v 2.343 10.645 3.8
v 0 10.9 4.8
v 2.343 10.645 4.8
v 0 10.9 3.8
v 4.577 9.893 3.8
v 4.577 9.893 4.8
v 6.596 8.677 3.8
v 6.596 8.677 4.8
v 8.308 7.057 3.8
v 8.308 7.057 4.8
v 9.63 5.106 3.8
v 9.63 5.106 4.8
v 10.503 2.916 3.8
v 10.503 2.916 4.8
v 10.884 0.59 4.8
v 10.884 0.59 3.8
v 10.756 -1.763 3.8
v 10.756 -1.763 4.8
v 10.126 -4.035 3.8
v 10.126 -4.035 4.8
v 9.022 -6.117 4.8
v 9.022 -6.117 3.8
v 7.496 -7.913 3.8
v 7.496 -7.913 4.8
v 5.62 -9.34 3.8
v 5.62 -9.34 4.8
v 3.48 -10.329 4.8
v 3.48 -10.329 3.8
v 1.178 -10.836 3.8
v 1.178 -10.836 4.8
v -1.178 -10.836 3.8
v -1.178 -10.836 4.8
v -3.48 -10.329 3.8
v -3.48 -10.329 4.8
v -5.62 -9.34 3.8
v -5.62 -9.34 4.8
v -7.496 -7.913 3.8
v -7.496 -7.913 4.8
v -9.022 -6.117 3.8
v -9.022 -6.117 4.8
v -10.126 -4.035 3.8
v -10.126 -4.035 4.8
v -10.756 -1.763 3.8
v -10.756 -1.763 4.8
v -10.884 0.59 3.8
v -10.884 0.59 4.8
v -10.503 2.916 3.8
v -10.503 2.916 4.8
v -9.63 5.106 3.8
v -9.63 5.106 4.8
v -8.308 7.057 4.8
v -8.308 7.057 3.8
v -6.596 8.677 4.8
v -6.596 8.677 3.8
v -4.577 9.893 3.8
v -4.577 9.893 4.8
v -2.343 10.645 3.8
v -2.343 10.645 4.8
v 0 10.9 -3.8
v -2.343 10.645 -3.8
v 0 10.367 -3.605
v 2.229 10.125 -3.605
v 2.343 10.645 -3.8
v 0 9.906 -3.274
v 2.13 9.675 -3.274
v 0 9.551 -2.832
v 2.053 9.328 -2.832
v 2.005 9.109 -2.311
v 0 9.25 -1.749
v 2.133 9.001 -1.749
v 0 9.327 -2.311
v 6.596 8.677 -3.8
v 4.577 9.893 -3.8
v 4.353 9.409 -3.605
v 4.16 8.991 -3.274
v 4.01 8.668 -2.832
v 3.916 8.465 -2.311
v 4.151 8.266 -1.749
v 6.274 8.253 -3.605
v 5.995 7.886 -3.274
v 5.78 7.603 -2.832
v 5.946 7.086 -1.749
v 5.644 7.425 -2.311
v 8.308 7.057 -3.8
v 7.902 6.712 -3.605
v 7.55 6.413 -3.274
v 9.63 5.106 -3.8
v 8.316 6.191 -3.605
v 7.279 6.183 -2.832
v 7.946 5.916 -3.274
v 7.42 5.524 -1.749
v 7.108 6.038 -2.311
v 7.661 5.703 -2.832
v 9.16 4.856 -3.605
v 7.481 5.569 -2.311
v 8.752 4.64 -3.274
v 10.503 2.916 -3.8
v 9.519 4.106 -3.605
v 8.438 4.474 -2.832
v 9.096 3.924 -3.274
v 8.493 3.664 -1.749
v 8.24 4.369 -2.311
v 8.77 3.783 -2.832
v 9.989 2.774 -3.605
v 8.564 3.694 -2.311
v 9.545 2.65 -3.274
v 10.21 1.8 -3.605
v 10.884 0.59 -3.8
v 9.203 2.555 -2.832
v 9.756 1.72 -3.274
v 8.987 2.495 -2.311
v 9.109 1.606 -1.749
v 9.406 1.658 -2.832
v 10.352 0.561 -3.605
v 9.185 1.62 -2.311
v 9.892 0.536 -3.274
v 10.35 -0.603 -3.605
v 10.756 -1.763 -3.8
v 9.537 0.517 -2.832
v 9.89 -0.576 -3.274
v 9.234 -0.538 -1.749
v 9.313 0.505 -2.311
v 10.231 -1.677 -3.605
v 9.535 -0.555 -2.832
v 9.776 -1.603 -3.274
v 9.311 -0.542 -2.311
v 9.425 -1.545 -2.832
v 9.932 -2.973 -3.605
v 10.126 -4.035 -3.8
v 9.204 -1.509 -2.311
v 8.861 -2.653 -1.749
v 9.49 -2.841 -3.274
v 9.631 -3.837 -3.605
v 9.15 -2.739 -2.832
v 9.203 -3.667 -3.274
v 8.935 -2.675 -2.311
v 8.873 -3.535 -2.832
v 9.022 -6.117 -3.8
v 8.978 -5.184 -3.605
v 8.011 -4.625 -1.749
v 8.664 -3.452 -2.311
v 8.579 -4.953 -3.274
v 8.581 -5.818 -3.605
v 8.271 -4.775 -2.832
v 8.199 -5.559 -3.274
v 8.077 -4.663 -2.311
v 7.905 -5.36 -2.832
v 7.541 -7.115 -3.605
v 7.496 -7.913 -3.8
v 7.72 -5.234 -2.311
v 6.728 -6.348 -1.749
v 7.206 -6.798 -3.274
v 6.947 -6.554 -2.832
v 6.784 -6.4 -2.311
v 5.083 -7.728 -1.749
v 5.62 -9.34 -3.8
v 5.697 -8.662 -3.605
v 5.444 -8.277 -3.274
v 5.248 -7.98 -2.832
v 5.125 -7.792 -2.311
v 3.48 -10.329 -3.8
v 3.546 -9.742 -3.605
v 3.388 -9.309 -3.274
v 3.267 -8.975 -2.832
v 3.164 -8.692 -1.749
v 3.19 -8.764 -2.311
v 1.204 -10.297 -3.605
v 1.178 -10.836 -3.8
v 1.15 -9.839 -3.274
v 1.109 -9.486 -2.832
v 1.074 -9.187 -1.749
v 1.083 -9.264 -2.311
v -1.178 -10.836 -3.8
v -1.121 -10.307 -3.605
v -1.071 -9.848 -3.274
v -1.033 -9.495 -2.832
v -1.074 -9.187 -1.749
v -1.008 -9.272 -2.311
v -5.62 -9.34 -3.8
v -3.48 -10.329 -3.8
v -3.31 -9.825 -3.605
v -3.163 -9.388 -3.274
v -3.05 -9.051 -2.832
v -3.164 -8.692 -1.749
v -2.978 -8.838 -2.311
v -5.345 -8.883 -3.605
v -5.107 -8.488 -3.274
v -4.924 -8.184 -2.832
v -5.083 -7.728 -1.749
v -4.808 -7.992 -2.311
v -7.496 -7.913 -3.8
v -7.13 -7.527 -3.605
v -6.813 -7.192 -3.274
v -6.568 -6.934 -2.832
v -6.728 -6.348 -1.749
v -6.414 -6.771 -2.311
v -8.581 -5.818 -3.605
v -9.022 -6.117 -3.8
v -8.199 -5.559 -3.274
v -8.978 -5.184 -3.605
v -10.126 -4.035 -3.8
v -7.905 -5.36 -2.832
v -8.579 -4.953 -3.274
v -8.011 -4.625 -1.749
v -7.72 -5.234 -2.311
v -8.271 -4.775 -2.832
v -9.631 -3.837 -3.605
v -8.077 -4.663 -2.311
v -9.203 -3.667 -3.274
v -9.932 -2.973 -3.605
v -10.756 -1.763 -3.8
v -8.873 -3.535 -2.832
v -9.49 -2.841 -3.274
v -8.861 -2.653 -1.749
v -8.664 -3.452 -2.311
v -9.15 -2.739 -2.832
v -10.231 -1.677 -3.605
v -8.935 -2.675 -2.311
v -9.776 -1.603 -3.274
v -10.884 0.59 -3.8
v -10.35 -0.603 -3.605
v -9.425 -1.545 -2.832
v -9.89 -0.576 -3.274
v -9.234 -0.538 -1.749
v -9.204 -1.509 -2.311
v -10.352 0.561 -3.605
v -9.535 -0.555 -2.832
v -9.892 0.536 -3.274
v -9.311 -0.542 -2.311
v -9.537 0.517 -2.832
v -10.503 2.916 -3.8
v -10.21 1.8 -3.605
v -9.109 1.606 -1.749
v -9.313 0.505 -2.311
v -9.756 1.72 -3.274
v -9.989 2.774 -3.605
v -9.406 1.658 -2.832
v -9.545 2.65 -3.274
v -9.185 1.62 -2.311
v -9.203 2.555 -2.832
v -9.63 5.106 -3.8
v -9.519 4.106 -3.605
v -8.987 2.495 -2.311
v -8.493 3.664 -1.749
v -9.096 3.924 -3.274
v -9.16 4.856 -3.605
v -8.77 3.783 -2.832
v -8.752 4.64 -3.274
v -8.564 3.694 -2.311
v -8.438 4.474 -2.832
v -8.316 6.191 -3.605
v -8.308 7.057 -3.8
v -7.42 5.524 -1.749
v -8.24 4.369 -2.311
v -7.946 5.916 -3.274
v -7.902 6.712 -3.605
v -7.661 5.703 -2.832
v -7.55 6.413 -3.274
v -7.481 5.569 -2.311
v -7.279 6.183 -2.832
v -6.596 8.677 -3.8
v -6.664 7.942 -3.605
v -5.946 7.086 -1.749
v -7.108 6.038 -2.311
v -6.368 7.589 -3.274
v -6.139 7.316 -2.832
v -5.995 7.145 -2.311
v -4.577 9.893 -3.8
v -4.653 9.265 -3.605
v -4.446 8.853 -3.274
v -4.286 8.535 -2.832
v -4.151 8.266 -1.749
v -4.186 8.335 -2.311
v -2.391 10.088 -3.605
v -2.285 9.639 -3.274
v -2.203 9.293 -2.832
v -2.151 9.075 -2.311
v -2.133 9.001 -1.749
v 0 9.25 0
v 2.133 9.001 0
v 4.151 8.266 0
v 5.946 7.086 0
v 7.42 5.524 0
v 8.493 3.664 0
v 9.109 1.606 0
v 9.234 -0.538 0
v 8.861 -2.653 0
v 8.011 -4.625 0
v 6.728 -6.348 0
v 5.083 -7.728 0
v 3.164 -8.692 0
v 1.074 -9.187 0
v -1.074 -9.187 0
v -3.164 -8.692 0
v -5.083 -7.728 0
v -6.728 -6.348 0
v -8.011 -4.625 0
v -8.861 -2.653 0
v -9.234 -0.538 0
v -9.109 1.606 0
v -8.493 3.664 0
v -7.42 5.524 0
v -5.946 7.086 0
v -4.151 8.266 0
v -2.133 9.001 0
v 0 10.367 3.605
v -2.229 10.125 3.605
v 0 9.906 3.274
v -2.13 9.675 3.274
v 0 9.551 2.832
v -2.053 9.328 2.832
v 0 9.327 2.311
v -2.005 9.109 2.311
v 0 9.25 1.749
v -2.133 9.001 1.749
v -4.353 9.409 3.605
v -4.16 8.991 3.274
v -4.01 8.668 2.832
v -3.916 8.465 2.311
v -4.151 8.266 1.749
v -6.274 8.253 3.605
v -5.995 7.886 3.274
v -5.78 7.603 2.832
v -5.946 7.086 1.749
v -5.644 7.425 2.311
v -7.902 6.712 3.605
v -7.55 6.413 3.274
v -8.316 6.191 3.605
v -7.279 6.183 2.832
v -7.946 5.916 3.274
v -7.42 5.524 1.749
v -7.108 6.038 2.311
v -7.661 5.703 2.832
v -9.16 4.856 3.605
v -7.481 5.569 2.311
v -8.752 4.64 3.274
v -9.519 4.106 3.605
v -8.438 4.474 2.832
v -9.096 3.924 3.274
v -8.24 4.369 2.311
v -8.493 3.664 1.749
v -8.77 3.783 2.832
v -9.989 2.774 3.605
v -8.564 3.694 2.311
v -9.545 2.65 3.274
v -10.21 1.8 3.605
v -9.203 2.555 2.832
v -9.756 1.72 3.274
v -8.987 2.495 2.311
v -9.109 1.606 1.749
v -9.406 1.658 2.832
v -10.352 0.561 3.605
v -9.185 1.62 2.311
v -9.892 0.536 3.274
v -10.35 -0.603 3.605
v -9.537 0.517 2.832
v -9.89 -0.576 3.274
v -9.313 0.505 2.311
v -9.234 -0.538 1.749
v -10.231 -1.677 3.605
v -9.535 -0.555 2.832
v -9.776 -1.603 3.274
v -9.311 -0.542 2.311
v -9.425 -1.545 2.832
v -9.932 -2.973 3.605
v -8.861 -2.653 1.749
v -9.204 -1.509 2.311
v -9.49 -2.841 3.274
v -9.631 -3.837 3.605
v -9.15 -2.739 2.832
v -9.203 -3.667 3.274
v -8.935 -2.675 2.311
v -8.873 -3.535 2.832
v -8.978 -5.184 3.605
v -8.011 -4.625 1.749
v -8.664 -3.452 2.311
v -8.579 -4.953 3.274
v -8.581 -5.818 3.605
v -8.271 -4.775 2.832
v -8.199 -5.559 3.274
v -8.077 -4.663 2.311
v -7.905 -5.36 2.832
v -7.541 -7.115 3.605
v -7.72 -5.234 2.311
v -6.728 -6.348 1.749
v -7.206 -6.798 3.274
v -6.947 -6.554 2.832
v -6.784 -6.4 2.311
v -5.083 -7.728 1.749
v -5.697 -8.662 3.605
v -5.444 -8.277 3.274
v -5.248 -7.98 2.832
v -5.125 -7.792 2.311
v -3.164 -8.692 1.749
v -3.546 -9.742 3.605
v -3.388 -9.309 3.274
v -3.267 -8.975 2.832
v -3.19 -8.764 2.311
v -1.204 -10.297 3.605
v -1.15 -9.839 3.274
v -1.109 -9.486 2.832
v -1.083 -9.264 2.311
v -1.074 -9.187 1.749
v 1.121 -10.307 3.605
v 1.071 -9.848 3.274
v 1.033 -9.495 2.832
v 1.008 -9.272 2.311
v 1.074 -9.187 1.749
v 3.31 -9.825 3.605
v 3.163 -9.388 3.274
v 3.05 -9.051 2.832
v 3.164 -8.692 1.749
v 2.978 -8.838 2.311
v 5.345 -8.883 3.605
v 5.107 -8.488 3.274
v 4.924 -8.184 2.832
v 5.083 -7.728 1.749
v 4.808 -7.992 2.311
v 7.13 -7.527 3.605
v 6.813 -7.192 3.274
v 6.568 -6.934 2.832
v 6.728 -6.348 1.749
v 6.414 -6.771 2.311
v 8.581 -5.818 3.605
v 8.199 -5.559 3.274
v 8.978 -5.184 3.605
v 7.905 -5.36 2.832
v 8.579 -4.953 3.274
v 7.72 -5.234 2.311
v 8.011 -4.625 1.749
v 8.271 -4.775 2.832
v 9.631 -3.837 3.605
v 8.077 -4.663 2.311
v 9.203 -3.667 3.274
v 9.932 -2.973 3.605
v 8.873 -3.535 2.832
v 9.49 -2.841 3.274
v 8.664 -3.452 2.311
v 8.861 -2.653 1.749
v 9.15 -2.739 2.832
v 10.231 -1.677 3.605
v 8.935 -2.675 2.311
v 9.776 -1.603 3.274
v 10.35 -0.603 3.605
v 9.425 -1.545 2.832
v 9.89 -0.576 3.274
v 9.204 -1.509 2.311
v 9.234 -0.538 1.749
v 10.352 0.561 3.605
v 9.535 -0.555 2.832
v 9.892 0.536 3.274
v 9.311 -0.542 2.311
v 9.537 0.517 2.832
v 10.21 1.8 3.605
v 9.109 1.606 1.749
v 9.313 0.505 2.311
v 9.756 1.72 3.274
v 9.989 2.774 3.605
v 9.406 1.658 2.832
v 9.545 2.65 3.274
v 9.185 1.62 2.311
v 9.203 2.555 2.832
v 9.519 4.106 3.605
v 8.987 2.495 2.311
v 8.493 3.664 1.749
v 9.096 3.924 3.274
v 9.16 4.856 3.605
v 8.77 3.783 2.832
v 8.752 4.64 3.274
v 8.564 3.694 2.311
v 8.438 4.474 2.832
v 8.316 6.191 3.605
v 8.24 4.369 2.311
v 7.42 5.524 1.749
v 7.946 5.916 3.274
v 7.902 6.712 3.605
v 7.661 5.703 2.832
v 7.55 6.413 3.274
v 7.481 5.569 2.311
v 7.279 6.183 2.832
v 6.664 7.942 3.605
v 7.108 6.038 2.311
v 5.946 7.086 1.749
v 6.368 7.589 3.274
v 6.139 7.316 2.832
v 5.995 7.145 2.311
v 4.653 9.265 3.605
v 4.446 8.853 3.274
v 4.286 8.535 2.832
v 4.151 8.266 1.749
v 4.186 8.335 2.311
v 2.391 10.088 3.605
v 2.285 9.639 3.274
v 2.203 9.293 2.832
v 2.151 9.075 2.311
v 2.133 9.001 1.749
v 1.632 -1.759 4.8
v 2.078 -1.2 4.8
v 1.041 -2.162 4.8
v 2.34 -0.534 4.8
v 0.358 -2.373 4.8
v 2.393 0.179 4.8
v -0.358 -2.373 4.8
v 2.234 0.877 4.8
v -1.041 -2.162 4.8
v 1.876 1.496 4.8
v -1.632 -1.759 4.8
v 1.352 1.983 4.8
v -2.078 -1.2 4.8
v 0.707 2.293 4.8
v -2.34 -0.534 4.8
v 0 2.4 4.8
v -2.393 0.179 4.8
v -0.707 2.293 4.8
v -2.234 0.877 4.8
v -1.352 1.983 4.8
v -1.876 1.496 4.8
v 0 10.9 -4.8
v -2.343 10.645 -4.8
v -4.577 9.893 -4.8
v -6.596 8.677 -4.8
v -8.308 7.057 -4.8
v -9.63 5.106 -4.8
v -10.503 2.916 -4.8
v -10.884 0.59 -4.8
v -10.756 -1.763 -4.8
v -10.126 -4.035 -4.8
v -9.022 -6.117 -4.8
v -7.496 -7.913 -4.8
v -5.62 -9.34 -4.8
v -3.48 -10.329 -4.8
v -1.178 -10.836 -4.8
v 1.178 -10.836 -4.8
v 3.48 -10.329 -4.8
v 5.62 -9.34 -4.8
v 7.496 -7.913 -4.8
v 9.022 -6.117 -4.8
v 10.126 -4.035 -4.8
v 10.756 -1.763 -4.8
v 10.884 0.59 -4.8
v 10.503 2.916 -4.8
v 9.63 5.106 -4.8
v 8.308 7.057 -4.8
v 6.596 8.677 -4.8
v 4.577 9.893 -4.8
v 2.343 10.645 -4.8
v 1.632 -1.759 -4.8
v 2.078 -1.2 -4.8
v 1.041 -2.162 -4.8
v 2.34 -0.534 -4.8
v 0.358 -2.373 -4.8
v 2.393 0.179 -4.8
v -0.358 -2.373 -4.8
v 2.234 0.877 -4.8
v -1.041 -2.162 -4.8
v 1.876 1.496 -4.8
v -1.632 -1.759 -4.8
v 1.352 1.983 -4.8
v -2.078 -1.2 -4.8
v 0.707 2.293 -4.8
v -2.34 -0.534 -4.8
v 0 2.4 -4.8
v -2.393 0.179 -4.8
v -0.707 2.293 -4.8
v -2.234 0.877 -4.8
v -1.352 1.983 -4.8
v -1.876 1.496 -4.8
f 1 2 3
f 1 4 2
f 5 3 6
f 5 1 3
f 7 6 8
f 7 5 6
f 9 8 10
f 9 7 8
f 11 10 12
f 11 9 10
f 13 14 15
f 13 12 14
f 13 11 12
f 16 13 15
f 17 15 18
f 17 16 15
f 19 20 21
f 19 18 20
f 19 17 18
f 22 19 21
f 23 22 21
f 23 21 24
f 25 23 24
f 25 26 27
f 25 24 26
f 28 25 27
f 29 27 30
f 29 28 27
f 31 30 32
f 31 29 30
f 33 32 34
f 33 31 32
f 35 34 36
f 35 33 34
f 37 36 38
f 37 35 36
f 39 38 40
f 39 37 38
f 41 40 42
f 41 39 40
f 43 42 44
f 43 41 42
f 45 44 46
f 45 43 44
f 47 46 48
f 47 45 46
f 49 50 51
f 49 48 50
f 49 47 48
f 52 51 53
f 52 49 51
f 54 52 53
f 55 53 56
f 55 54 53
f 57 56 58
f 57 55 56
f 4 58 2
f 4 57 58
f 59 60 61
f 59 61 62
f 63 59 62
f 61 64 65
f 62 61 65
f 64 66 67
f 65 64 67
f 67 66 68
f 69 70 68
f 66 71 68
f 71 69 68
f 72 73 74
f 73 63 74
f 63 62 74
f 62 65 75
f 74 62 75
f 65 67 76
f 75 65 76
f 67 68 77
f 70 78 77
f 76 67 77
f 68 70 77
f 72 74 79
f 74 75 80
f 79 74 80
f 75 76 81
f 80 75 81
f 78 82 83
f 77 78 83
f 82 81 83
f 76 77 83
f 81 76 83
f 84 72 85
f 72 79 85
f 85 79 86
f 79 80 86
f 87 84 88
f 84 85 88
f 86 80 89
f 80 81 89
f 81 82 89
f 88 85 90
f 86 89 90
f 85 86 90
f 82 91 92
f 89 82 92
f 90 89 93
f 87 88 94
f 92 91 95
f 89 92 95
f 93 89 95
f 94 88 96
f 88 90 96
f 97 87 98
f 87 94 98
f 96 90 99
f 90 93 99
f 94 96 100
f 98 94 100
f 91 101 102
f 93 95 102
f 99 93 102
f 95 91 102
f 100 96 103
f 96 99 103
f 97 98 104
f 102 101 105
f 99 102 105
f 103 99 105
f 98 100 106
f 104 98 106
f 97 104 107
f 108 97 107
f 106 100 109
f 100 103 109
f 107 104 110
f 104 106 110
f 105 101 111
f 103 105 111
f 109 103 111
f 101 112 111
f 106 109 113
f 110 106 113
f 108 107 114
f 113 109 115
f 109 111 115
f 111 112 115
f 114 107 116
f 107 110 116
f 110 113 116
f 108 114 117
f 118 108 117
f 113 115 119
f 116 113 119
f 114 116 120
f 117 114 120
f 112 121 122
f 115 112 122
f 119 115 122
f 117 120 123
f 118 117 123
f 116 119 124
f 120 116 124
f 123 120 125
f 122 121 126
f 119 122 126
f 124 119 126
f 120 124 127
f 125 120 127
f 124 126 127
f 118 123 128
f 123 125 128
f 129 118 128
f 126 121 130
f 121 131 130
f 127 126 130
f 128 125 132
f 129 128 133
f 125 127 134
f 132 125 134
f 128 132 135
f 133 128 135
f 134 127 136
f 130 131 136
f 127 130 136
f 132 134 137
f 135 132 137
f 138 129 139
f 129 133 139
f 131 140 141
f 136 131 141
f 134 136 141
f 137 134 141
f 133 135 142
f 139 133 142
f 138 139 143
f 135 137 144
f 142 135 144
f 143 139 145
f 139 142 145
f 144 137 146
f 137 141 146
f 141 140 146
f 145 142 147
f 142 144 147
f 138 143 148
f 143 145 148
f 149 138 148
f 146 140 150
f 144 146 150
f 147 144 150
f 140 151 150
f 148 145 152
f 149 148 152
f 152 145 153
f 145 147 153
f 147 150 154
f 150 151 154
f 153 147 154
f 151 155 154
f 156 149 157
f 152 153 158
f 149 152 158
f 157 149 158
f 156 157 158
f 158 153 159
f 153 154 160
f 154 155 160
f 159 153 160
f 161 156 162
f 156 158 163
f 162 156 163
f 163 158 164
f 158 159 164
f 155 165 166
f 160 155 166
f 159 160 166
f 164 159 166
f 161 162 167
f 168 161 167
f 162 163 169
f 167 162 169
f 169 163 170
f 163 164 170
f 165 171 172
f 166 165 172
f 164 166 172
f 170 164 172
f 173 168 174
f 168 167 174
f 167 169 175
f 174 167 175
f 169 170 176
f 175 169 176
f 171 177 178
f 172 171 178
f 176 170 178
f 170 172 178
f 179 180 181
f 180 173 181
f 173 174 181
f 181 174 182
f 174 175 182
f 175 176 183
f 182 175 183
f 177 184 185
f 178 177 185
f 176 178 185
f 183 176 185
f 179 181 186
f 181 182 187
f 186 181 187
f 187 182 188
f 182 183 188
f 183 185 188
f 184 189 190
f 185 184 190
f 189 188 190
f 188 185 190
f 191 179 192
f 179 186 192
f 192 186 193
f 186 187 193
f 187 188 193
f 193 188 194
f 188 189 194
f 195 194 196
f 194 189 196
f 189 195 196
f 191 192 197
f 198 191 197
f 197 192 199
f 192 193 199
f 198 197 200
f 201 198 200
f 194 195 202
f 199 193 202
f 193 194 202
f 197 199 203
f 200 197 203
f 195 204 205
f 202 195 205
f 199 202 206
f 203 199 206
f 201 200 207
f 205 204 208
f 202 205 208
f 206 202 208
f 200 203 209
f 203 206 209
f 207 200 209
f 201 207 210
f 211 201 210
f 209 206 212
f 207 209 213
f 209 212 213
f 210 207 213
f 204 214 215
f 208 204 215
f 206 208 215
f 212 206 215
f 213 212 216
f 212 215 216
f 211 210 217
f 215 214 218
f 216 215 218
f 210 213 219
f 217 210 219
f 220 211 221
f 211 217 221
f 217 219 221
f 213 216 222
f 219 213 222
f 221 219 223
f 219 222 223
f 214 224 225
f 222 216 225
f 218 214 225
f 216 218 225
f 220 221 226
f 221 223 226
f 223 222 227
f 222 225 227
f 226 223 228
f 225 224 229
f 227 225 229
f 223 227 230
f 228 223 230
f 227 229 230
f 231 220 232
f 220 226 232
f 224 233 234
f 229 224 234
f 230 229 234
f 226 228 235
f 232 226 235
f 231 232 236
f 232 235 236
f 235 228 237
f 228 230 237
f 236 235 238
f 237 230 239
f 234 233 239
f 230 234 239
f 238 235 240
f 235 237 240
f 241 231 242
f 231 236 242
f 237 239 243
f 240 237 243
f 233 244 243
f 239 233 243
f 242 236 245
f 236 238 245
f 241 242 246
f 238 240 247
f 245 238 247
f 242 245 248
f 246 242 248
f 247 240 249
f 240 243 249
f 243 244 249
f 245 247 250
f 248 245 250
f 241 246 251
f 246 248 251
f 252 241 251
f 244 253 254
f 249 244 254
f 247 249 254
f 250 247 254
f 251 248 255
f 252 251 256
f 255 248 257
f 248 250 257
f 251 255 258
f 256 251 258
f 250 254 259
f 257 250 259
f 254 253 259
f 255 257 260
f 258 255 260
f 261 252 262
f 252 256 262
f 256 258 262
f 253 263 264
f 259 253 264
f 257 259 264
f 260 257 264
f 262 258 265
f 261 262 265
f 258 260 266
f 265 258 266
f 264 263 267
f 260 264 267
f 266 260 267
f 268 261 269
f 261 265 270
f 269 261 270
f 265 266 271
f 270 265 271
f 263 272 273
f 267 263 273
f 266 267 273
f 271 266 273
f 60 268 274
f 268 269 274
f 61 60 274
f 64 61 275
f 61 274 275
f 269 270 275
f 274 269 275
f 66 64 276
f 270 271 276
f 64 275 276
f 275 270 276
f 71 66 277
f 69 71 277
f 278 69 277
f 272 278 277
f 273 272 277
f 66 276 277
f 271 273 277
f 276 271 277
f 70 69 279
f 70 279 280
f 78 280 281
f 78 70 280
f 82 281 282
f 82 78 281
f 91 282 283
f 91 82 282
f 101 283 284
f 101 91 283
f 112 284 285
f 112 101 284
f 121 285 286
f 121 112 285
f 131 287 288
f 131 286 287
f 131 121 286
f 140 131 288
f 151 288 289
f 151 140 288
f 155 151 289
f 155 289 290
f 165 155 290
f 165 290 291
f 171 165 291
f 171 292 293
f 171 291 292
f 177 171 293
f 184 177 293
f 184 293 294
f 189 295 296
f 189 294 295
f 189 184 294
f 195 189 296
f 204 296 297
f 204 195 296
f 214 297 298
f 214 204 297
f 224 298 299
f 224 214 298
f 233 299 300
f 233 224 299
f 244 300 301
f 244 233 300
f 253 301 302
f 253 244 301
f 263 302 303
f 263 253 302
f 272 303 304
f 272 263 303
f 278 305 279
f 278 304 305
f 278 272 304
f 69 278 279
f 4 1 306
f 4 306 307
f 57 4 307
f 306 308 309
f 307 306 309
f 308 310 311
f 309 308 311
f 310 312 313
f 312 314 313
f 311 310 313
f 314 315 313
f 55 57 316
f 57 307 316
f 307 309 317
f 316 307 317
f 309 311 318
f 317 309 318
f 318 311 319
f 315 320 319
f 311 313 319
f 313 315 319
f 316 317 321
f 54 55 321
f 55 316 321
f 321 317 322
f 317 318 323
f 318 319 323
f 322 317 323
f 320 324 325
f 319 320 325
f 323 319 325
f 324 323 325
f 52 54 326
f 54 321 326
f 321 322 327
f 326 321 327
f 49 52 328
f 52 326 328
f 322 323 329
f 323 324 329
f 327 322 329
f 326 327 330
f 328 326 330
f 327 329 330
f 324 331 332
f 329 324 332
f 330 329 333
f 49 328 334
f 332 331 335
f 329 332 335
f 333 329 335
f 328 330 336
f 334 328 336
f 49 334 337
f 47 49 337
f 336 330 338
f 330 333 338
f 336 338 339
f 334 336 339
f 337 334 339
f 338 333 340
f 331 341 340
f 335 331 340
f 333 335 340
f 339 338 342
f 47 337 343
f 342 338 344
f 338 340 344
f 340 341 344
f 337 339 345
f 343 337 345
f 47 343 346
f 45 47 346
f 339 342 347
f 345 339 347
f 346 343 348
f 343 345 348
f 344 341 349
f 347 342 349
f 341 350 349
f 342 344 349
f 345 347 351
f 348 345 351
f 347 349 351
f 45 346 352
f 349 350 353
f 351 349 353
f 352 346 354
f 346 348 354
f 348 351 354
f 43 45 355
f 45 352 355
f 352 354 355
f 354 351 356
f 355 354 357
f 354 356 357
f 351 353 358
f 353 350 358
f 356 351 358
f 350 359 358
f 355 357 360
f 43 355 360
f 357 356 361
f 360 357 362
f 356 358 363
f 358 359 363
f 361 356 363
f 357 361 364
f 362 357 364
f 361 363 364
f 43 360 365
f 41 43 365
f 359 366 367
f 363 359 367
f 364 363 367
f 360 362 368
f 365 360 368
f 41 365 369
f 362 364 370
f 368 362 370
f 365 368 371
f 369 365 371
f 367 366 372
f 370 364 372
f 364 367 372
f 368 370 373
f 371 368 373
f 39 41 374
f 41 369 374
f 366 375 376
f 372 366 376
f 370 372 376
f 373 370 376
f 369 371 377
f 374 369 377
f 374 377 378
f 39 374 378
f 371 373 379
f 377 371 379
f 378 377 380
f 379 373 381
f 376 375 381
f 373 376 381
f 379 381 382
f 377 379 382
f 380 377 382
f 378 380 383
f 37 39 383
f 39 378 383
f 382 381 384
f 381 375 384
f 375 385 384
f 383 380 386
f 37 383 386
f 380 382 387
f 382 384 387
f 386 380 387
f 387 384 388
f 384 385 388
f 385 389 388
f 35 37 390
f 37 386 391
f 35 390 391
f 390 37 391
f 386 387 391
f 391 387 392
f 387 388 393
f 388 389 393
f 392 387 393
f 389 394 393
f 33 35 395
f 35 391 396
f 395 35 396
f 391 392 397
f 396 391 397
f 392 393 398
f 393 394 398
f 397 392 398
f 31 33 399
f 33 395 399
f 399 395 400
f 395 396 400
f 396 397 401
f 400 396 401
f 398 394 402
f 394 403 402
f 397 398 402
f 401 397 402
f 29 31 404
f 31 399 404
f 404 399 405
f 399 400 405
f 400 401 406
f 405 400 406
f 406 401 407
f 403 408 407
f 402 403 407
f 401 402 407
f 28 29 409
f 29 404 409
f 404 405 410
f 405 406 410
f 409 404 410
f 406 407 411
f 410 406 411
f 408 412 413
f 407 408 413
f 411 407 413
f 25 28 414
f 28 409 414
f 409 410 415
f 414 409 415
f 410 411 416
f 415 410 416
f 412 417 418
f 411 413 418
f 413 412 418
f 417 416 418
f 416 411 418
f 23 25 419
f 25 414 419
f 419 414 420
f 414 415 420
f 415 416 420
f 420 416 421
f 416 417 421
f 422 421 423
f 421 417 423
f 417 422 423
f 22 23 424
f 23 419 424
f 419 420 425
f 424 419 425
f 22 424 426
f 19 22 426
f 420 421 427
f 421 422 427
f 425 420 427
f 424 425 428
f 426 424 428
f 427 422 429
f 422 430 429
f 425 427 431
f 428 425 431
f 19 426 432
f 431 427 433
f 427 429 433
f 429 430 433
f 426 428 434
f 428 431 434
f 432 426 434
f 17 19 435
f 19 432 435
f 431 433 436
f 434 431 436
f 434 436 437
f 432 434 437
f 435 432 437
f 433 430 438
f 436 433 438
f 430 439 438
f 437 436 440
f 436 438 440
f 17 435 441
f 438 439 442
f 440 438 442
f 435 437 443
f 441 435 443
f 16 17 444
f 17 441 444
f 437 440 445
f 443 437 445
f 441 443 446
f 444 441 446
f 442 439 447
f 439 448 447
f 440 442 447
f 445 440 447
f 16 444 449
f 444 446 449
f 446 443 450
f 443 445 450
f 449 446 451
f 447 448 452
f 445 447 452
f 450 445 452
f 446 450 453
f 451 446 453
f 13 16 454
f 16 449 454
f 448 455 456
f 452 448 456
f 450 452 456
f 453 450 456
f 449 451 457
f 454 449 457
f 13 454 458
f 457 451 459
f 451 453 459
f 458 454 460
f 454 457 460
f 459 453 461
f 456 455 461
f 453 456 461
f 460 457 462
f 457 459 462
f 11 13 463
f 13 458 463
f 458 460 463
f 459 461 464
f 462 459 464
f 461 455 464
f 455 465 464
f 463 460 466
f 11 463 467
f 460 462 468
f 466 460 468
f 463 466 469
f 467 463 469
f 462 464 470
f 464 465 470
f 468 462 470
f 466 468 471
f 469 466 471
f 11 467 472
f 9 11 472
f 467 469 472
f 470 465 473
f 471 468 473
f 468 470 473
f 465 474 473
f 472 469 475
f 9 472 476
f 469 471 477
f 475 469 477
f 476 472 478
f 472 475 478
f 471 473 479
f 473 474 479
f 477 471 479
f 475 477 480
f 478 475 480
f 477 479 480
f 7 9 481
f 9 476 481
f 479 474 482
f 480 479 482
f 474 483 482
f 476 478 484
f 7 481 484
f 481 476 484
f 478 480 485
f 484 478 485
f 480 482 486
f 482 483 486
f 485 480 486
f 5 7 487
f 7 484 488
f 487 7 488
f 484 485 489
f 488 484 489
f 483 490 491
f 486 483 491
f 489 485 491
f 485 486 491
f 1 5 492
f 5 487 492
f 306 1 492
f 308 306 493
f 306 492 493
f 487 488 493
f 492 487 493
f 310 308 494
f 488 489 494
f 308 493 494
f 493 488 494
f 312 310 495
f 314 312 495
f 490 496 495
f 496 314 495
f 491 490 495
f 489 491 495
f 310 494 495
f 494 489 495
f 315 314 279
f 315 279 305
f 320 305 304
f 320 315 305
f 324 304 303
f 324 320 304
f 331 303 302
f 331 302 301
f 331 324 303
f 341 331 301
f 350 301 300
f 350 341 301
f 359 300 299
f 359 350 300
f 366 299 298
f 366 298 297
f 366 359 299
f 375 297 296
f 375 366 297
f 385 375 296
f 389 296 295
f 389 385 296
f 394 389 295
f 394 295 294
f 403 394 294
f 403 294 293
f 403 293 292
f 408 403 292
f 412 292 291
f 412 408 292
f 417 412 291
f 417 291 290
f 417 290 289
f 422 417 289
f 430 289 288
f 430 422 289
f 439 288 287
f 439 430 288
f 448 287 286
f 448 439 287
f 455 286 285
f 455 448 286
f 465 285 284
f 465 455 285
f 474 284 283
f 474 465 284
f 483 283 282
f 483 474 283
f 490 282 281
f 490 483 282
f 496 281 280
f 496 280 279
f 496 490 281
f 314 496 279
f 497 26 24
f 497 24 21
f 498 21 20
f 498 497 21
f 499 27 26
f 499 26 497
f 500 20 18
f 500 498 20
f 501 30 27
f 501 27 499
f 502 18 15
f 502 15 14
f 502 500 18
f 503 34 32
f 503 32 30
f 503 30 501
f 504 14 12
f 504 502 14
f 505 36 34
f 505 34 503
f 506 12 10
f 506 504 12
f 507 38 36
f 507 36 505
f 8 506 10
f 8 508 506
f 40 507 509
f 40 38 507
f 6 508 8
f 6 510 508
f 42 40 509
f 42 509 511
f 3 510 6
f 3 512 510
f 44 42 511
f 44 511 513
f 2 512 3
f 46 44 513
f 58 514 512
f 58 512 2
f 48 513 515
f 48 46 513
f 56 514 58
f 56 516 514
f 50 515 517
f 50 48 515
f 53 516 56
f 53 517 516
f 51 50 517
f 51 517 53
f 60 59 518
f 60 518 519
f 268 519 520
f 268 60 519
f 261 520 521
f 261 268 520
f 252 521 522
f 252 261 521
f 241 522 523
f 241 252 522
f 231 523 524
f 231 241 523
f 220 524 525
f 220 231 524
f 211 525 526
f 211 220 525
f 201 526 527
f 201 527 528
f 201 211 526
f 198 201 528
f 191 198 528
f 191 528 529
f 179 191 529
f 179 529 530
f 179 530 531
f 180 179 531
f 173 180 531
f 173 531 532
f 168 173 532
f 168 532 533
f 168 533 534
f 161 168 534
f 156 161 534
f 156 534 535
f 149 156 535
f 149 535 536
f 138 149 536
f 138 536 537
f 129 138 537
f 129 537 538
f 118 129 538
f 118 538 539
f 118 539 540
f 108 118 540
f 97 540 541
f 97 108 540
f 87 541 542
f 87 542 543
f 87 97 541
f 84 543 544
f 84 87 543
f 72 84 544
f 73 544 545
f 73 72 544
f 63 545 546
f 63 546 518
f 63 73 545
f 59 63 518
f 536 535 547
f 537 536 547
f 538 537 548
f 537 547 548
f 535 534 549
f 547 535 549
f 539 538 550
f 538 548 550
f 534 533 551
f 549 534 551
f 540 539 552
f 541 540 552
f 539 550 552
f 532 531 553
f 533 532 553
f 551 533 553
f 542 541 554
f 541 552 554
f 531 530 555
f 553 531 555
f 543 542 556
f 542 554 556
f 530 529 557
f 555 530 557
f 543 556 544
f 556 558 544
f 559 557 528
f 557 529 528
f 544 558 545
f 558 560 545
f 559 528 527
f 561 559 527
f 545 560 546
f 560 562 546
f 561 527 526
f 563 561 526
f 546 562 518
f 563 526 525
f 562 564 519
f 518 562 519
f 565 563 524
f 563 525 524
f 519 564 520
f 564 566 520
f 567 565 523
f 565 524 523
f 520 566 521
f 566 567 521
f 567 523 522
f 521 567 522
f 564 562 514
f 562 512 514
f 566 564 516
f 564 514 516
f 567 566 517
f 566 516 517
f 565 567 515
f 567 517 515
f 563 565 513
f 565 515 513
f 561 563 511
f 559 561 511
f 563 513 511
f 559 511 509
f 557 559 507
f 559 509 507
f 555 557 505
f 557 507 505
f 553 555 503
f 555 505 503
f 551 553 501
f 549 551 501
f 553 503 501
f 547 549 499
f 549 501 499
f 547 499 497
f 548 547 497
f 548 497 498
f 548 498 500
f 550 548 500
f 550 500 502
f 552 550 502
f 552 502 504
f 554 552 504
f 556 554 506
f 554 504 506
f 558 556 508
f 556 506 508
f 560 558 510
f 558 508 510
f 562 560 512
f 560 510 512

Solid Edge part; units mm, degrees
sketch "Sketch1" plane through (0, 0, 0) normal (1, 0, 0) x (0, 1, 0)
  line L0 (2.4, -4.8) -> (10.9, -4.8)
  line L1 (10.9, -4.8) -> (10.9, -3.8)
  arc A0 (10.9, -3.8) -> (9.25, -1.7488) centre (11.35, -1.7488) cw
  line L2 (9.25, 0) -> (9.25, -1.7488)
  line L3 (9.25, 0) -> (9.25, 1.7488)
  arc A1 (10.9, 3.8) -> (9.25, 1.7488) centre (11.35, 1.7488) ccw
  line L4 (10.9, 4.8) -> (10.9, 3.8)
  line L5 (2.4, 4.8) -> (10.9, 4.8)
  line L6 (2.4, -4.8) -> (2.4, 4.8)
revolve "RevolvedProtrusion1" add sketch "Sketch1" angle 360 about axis through (0, 0, 0) along (0, 0, 1)
